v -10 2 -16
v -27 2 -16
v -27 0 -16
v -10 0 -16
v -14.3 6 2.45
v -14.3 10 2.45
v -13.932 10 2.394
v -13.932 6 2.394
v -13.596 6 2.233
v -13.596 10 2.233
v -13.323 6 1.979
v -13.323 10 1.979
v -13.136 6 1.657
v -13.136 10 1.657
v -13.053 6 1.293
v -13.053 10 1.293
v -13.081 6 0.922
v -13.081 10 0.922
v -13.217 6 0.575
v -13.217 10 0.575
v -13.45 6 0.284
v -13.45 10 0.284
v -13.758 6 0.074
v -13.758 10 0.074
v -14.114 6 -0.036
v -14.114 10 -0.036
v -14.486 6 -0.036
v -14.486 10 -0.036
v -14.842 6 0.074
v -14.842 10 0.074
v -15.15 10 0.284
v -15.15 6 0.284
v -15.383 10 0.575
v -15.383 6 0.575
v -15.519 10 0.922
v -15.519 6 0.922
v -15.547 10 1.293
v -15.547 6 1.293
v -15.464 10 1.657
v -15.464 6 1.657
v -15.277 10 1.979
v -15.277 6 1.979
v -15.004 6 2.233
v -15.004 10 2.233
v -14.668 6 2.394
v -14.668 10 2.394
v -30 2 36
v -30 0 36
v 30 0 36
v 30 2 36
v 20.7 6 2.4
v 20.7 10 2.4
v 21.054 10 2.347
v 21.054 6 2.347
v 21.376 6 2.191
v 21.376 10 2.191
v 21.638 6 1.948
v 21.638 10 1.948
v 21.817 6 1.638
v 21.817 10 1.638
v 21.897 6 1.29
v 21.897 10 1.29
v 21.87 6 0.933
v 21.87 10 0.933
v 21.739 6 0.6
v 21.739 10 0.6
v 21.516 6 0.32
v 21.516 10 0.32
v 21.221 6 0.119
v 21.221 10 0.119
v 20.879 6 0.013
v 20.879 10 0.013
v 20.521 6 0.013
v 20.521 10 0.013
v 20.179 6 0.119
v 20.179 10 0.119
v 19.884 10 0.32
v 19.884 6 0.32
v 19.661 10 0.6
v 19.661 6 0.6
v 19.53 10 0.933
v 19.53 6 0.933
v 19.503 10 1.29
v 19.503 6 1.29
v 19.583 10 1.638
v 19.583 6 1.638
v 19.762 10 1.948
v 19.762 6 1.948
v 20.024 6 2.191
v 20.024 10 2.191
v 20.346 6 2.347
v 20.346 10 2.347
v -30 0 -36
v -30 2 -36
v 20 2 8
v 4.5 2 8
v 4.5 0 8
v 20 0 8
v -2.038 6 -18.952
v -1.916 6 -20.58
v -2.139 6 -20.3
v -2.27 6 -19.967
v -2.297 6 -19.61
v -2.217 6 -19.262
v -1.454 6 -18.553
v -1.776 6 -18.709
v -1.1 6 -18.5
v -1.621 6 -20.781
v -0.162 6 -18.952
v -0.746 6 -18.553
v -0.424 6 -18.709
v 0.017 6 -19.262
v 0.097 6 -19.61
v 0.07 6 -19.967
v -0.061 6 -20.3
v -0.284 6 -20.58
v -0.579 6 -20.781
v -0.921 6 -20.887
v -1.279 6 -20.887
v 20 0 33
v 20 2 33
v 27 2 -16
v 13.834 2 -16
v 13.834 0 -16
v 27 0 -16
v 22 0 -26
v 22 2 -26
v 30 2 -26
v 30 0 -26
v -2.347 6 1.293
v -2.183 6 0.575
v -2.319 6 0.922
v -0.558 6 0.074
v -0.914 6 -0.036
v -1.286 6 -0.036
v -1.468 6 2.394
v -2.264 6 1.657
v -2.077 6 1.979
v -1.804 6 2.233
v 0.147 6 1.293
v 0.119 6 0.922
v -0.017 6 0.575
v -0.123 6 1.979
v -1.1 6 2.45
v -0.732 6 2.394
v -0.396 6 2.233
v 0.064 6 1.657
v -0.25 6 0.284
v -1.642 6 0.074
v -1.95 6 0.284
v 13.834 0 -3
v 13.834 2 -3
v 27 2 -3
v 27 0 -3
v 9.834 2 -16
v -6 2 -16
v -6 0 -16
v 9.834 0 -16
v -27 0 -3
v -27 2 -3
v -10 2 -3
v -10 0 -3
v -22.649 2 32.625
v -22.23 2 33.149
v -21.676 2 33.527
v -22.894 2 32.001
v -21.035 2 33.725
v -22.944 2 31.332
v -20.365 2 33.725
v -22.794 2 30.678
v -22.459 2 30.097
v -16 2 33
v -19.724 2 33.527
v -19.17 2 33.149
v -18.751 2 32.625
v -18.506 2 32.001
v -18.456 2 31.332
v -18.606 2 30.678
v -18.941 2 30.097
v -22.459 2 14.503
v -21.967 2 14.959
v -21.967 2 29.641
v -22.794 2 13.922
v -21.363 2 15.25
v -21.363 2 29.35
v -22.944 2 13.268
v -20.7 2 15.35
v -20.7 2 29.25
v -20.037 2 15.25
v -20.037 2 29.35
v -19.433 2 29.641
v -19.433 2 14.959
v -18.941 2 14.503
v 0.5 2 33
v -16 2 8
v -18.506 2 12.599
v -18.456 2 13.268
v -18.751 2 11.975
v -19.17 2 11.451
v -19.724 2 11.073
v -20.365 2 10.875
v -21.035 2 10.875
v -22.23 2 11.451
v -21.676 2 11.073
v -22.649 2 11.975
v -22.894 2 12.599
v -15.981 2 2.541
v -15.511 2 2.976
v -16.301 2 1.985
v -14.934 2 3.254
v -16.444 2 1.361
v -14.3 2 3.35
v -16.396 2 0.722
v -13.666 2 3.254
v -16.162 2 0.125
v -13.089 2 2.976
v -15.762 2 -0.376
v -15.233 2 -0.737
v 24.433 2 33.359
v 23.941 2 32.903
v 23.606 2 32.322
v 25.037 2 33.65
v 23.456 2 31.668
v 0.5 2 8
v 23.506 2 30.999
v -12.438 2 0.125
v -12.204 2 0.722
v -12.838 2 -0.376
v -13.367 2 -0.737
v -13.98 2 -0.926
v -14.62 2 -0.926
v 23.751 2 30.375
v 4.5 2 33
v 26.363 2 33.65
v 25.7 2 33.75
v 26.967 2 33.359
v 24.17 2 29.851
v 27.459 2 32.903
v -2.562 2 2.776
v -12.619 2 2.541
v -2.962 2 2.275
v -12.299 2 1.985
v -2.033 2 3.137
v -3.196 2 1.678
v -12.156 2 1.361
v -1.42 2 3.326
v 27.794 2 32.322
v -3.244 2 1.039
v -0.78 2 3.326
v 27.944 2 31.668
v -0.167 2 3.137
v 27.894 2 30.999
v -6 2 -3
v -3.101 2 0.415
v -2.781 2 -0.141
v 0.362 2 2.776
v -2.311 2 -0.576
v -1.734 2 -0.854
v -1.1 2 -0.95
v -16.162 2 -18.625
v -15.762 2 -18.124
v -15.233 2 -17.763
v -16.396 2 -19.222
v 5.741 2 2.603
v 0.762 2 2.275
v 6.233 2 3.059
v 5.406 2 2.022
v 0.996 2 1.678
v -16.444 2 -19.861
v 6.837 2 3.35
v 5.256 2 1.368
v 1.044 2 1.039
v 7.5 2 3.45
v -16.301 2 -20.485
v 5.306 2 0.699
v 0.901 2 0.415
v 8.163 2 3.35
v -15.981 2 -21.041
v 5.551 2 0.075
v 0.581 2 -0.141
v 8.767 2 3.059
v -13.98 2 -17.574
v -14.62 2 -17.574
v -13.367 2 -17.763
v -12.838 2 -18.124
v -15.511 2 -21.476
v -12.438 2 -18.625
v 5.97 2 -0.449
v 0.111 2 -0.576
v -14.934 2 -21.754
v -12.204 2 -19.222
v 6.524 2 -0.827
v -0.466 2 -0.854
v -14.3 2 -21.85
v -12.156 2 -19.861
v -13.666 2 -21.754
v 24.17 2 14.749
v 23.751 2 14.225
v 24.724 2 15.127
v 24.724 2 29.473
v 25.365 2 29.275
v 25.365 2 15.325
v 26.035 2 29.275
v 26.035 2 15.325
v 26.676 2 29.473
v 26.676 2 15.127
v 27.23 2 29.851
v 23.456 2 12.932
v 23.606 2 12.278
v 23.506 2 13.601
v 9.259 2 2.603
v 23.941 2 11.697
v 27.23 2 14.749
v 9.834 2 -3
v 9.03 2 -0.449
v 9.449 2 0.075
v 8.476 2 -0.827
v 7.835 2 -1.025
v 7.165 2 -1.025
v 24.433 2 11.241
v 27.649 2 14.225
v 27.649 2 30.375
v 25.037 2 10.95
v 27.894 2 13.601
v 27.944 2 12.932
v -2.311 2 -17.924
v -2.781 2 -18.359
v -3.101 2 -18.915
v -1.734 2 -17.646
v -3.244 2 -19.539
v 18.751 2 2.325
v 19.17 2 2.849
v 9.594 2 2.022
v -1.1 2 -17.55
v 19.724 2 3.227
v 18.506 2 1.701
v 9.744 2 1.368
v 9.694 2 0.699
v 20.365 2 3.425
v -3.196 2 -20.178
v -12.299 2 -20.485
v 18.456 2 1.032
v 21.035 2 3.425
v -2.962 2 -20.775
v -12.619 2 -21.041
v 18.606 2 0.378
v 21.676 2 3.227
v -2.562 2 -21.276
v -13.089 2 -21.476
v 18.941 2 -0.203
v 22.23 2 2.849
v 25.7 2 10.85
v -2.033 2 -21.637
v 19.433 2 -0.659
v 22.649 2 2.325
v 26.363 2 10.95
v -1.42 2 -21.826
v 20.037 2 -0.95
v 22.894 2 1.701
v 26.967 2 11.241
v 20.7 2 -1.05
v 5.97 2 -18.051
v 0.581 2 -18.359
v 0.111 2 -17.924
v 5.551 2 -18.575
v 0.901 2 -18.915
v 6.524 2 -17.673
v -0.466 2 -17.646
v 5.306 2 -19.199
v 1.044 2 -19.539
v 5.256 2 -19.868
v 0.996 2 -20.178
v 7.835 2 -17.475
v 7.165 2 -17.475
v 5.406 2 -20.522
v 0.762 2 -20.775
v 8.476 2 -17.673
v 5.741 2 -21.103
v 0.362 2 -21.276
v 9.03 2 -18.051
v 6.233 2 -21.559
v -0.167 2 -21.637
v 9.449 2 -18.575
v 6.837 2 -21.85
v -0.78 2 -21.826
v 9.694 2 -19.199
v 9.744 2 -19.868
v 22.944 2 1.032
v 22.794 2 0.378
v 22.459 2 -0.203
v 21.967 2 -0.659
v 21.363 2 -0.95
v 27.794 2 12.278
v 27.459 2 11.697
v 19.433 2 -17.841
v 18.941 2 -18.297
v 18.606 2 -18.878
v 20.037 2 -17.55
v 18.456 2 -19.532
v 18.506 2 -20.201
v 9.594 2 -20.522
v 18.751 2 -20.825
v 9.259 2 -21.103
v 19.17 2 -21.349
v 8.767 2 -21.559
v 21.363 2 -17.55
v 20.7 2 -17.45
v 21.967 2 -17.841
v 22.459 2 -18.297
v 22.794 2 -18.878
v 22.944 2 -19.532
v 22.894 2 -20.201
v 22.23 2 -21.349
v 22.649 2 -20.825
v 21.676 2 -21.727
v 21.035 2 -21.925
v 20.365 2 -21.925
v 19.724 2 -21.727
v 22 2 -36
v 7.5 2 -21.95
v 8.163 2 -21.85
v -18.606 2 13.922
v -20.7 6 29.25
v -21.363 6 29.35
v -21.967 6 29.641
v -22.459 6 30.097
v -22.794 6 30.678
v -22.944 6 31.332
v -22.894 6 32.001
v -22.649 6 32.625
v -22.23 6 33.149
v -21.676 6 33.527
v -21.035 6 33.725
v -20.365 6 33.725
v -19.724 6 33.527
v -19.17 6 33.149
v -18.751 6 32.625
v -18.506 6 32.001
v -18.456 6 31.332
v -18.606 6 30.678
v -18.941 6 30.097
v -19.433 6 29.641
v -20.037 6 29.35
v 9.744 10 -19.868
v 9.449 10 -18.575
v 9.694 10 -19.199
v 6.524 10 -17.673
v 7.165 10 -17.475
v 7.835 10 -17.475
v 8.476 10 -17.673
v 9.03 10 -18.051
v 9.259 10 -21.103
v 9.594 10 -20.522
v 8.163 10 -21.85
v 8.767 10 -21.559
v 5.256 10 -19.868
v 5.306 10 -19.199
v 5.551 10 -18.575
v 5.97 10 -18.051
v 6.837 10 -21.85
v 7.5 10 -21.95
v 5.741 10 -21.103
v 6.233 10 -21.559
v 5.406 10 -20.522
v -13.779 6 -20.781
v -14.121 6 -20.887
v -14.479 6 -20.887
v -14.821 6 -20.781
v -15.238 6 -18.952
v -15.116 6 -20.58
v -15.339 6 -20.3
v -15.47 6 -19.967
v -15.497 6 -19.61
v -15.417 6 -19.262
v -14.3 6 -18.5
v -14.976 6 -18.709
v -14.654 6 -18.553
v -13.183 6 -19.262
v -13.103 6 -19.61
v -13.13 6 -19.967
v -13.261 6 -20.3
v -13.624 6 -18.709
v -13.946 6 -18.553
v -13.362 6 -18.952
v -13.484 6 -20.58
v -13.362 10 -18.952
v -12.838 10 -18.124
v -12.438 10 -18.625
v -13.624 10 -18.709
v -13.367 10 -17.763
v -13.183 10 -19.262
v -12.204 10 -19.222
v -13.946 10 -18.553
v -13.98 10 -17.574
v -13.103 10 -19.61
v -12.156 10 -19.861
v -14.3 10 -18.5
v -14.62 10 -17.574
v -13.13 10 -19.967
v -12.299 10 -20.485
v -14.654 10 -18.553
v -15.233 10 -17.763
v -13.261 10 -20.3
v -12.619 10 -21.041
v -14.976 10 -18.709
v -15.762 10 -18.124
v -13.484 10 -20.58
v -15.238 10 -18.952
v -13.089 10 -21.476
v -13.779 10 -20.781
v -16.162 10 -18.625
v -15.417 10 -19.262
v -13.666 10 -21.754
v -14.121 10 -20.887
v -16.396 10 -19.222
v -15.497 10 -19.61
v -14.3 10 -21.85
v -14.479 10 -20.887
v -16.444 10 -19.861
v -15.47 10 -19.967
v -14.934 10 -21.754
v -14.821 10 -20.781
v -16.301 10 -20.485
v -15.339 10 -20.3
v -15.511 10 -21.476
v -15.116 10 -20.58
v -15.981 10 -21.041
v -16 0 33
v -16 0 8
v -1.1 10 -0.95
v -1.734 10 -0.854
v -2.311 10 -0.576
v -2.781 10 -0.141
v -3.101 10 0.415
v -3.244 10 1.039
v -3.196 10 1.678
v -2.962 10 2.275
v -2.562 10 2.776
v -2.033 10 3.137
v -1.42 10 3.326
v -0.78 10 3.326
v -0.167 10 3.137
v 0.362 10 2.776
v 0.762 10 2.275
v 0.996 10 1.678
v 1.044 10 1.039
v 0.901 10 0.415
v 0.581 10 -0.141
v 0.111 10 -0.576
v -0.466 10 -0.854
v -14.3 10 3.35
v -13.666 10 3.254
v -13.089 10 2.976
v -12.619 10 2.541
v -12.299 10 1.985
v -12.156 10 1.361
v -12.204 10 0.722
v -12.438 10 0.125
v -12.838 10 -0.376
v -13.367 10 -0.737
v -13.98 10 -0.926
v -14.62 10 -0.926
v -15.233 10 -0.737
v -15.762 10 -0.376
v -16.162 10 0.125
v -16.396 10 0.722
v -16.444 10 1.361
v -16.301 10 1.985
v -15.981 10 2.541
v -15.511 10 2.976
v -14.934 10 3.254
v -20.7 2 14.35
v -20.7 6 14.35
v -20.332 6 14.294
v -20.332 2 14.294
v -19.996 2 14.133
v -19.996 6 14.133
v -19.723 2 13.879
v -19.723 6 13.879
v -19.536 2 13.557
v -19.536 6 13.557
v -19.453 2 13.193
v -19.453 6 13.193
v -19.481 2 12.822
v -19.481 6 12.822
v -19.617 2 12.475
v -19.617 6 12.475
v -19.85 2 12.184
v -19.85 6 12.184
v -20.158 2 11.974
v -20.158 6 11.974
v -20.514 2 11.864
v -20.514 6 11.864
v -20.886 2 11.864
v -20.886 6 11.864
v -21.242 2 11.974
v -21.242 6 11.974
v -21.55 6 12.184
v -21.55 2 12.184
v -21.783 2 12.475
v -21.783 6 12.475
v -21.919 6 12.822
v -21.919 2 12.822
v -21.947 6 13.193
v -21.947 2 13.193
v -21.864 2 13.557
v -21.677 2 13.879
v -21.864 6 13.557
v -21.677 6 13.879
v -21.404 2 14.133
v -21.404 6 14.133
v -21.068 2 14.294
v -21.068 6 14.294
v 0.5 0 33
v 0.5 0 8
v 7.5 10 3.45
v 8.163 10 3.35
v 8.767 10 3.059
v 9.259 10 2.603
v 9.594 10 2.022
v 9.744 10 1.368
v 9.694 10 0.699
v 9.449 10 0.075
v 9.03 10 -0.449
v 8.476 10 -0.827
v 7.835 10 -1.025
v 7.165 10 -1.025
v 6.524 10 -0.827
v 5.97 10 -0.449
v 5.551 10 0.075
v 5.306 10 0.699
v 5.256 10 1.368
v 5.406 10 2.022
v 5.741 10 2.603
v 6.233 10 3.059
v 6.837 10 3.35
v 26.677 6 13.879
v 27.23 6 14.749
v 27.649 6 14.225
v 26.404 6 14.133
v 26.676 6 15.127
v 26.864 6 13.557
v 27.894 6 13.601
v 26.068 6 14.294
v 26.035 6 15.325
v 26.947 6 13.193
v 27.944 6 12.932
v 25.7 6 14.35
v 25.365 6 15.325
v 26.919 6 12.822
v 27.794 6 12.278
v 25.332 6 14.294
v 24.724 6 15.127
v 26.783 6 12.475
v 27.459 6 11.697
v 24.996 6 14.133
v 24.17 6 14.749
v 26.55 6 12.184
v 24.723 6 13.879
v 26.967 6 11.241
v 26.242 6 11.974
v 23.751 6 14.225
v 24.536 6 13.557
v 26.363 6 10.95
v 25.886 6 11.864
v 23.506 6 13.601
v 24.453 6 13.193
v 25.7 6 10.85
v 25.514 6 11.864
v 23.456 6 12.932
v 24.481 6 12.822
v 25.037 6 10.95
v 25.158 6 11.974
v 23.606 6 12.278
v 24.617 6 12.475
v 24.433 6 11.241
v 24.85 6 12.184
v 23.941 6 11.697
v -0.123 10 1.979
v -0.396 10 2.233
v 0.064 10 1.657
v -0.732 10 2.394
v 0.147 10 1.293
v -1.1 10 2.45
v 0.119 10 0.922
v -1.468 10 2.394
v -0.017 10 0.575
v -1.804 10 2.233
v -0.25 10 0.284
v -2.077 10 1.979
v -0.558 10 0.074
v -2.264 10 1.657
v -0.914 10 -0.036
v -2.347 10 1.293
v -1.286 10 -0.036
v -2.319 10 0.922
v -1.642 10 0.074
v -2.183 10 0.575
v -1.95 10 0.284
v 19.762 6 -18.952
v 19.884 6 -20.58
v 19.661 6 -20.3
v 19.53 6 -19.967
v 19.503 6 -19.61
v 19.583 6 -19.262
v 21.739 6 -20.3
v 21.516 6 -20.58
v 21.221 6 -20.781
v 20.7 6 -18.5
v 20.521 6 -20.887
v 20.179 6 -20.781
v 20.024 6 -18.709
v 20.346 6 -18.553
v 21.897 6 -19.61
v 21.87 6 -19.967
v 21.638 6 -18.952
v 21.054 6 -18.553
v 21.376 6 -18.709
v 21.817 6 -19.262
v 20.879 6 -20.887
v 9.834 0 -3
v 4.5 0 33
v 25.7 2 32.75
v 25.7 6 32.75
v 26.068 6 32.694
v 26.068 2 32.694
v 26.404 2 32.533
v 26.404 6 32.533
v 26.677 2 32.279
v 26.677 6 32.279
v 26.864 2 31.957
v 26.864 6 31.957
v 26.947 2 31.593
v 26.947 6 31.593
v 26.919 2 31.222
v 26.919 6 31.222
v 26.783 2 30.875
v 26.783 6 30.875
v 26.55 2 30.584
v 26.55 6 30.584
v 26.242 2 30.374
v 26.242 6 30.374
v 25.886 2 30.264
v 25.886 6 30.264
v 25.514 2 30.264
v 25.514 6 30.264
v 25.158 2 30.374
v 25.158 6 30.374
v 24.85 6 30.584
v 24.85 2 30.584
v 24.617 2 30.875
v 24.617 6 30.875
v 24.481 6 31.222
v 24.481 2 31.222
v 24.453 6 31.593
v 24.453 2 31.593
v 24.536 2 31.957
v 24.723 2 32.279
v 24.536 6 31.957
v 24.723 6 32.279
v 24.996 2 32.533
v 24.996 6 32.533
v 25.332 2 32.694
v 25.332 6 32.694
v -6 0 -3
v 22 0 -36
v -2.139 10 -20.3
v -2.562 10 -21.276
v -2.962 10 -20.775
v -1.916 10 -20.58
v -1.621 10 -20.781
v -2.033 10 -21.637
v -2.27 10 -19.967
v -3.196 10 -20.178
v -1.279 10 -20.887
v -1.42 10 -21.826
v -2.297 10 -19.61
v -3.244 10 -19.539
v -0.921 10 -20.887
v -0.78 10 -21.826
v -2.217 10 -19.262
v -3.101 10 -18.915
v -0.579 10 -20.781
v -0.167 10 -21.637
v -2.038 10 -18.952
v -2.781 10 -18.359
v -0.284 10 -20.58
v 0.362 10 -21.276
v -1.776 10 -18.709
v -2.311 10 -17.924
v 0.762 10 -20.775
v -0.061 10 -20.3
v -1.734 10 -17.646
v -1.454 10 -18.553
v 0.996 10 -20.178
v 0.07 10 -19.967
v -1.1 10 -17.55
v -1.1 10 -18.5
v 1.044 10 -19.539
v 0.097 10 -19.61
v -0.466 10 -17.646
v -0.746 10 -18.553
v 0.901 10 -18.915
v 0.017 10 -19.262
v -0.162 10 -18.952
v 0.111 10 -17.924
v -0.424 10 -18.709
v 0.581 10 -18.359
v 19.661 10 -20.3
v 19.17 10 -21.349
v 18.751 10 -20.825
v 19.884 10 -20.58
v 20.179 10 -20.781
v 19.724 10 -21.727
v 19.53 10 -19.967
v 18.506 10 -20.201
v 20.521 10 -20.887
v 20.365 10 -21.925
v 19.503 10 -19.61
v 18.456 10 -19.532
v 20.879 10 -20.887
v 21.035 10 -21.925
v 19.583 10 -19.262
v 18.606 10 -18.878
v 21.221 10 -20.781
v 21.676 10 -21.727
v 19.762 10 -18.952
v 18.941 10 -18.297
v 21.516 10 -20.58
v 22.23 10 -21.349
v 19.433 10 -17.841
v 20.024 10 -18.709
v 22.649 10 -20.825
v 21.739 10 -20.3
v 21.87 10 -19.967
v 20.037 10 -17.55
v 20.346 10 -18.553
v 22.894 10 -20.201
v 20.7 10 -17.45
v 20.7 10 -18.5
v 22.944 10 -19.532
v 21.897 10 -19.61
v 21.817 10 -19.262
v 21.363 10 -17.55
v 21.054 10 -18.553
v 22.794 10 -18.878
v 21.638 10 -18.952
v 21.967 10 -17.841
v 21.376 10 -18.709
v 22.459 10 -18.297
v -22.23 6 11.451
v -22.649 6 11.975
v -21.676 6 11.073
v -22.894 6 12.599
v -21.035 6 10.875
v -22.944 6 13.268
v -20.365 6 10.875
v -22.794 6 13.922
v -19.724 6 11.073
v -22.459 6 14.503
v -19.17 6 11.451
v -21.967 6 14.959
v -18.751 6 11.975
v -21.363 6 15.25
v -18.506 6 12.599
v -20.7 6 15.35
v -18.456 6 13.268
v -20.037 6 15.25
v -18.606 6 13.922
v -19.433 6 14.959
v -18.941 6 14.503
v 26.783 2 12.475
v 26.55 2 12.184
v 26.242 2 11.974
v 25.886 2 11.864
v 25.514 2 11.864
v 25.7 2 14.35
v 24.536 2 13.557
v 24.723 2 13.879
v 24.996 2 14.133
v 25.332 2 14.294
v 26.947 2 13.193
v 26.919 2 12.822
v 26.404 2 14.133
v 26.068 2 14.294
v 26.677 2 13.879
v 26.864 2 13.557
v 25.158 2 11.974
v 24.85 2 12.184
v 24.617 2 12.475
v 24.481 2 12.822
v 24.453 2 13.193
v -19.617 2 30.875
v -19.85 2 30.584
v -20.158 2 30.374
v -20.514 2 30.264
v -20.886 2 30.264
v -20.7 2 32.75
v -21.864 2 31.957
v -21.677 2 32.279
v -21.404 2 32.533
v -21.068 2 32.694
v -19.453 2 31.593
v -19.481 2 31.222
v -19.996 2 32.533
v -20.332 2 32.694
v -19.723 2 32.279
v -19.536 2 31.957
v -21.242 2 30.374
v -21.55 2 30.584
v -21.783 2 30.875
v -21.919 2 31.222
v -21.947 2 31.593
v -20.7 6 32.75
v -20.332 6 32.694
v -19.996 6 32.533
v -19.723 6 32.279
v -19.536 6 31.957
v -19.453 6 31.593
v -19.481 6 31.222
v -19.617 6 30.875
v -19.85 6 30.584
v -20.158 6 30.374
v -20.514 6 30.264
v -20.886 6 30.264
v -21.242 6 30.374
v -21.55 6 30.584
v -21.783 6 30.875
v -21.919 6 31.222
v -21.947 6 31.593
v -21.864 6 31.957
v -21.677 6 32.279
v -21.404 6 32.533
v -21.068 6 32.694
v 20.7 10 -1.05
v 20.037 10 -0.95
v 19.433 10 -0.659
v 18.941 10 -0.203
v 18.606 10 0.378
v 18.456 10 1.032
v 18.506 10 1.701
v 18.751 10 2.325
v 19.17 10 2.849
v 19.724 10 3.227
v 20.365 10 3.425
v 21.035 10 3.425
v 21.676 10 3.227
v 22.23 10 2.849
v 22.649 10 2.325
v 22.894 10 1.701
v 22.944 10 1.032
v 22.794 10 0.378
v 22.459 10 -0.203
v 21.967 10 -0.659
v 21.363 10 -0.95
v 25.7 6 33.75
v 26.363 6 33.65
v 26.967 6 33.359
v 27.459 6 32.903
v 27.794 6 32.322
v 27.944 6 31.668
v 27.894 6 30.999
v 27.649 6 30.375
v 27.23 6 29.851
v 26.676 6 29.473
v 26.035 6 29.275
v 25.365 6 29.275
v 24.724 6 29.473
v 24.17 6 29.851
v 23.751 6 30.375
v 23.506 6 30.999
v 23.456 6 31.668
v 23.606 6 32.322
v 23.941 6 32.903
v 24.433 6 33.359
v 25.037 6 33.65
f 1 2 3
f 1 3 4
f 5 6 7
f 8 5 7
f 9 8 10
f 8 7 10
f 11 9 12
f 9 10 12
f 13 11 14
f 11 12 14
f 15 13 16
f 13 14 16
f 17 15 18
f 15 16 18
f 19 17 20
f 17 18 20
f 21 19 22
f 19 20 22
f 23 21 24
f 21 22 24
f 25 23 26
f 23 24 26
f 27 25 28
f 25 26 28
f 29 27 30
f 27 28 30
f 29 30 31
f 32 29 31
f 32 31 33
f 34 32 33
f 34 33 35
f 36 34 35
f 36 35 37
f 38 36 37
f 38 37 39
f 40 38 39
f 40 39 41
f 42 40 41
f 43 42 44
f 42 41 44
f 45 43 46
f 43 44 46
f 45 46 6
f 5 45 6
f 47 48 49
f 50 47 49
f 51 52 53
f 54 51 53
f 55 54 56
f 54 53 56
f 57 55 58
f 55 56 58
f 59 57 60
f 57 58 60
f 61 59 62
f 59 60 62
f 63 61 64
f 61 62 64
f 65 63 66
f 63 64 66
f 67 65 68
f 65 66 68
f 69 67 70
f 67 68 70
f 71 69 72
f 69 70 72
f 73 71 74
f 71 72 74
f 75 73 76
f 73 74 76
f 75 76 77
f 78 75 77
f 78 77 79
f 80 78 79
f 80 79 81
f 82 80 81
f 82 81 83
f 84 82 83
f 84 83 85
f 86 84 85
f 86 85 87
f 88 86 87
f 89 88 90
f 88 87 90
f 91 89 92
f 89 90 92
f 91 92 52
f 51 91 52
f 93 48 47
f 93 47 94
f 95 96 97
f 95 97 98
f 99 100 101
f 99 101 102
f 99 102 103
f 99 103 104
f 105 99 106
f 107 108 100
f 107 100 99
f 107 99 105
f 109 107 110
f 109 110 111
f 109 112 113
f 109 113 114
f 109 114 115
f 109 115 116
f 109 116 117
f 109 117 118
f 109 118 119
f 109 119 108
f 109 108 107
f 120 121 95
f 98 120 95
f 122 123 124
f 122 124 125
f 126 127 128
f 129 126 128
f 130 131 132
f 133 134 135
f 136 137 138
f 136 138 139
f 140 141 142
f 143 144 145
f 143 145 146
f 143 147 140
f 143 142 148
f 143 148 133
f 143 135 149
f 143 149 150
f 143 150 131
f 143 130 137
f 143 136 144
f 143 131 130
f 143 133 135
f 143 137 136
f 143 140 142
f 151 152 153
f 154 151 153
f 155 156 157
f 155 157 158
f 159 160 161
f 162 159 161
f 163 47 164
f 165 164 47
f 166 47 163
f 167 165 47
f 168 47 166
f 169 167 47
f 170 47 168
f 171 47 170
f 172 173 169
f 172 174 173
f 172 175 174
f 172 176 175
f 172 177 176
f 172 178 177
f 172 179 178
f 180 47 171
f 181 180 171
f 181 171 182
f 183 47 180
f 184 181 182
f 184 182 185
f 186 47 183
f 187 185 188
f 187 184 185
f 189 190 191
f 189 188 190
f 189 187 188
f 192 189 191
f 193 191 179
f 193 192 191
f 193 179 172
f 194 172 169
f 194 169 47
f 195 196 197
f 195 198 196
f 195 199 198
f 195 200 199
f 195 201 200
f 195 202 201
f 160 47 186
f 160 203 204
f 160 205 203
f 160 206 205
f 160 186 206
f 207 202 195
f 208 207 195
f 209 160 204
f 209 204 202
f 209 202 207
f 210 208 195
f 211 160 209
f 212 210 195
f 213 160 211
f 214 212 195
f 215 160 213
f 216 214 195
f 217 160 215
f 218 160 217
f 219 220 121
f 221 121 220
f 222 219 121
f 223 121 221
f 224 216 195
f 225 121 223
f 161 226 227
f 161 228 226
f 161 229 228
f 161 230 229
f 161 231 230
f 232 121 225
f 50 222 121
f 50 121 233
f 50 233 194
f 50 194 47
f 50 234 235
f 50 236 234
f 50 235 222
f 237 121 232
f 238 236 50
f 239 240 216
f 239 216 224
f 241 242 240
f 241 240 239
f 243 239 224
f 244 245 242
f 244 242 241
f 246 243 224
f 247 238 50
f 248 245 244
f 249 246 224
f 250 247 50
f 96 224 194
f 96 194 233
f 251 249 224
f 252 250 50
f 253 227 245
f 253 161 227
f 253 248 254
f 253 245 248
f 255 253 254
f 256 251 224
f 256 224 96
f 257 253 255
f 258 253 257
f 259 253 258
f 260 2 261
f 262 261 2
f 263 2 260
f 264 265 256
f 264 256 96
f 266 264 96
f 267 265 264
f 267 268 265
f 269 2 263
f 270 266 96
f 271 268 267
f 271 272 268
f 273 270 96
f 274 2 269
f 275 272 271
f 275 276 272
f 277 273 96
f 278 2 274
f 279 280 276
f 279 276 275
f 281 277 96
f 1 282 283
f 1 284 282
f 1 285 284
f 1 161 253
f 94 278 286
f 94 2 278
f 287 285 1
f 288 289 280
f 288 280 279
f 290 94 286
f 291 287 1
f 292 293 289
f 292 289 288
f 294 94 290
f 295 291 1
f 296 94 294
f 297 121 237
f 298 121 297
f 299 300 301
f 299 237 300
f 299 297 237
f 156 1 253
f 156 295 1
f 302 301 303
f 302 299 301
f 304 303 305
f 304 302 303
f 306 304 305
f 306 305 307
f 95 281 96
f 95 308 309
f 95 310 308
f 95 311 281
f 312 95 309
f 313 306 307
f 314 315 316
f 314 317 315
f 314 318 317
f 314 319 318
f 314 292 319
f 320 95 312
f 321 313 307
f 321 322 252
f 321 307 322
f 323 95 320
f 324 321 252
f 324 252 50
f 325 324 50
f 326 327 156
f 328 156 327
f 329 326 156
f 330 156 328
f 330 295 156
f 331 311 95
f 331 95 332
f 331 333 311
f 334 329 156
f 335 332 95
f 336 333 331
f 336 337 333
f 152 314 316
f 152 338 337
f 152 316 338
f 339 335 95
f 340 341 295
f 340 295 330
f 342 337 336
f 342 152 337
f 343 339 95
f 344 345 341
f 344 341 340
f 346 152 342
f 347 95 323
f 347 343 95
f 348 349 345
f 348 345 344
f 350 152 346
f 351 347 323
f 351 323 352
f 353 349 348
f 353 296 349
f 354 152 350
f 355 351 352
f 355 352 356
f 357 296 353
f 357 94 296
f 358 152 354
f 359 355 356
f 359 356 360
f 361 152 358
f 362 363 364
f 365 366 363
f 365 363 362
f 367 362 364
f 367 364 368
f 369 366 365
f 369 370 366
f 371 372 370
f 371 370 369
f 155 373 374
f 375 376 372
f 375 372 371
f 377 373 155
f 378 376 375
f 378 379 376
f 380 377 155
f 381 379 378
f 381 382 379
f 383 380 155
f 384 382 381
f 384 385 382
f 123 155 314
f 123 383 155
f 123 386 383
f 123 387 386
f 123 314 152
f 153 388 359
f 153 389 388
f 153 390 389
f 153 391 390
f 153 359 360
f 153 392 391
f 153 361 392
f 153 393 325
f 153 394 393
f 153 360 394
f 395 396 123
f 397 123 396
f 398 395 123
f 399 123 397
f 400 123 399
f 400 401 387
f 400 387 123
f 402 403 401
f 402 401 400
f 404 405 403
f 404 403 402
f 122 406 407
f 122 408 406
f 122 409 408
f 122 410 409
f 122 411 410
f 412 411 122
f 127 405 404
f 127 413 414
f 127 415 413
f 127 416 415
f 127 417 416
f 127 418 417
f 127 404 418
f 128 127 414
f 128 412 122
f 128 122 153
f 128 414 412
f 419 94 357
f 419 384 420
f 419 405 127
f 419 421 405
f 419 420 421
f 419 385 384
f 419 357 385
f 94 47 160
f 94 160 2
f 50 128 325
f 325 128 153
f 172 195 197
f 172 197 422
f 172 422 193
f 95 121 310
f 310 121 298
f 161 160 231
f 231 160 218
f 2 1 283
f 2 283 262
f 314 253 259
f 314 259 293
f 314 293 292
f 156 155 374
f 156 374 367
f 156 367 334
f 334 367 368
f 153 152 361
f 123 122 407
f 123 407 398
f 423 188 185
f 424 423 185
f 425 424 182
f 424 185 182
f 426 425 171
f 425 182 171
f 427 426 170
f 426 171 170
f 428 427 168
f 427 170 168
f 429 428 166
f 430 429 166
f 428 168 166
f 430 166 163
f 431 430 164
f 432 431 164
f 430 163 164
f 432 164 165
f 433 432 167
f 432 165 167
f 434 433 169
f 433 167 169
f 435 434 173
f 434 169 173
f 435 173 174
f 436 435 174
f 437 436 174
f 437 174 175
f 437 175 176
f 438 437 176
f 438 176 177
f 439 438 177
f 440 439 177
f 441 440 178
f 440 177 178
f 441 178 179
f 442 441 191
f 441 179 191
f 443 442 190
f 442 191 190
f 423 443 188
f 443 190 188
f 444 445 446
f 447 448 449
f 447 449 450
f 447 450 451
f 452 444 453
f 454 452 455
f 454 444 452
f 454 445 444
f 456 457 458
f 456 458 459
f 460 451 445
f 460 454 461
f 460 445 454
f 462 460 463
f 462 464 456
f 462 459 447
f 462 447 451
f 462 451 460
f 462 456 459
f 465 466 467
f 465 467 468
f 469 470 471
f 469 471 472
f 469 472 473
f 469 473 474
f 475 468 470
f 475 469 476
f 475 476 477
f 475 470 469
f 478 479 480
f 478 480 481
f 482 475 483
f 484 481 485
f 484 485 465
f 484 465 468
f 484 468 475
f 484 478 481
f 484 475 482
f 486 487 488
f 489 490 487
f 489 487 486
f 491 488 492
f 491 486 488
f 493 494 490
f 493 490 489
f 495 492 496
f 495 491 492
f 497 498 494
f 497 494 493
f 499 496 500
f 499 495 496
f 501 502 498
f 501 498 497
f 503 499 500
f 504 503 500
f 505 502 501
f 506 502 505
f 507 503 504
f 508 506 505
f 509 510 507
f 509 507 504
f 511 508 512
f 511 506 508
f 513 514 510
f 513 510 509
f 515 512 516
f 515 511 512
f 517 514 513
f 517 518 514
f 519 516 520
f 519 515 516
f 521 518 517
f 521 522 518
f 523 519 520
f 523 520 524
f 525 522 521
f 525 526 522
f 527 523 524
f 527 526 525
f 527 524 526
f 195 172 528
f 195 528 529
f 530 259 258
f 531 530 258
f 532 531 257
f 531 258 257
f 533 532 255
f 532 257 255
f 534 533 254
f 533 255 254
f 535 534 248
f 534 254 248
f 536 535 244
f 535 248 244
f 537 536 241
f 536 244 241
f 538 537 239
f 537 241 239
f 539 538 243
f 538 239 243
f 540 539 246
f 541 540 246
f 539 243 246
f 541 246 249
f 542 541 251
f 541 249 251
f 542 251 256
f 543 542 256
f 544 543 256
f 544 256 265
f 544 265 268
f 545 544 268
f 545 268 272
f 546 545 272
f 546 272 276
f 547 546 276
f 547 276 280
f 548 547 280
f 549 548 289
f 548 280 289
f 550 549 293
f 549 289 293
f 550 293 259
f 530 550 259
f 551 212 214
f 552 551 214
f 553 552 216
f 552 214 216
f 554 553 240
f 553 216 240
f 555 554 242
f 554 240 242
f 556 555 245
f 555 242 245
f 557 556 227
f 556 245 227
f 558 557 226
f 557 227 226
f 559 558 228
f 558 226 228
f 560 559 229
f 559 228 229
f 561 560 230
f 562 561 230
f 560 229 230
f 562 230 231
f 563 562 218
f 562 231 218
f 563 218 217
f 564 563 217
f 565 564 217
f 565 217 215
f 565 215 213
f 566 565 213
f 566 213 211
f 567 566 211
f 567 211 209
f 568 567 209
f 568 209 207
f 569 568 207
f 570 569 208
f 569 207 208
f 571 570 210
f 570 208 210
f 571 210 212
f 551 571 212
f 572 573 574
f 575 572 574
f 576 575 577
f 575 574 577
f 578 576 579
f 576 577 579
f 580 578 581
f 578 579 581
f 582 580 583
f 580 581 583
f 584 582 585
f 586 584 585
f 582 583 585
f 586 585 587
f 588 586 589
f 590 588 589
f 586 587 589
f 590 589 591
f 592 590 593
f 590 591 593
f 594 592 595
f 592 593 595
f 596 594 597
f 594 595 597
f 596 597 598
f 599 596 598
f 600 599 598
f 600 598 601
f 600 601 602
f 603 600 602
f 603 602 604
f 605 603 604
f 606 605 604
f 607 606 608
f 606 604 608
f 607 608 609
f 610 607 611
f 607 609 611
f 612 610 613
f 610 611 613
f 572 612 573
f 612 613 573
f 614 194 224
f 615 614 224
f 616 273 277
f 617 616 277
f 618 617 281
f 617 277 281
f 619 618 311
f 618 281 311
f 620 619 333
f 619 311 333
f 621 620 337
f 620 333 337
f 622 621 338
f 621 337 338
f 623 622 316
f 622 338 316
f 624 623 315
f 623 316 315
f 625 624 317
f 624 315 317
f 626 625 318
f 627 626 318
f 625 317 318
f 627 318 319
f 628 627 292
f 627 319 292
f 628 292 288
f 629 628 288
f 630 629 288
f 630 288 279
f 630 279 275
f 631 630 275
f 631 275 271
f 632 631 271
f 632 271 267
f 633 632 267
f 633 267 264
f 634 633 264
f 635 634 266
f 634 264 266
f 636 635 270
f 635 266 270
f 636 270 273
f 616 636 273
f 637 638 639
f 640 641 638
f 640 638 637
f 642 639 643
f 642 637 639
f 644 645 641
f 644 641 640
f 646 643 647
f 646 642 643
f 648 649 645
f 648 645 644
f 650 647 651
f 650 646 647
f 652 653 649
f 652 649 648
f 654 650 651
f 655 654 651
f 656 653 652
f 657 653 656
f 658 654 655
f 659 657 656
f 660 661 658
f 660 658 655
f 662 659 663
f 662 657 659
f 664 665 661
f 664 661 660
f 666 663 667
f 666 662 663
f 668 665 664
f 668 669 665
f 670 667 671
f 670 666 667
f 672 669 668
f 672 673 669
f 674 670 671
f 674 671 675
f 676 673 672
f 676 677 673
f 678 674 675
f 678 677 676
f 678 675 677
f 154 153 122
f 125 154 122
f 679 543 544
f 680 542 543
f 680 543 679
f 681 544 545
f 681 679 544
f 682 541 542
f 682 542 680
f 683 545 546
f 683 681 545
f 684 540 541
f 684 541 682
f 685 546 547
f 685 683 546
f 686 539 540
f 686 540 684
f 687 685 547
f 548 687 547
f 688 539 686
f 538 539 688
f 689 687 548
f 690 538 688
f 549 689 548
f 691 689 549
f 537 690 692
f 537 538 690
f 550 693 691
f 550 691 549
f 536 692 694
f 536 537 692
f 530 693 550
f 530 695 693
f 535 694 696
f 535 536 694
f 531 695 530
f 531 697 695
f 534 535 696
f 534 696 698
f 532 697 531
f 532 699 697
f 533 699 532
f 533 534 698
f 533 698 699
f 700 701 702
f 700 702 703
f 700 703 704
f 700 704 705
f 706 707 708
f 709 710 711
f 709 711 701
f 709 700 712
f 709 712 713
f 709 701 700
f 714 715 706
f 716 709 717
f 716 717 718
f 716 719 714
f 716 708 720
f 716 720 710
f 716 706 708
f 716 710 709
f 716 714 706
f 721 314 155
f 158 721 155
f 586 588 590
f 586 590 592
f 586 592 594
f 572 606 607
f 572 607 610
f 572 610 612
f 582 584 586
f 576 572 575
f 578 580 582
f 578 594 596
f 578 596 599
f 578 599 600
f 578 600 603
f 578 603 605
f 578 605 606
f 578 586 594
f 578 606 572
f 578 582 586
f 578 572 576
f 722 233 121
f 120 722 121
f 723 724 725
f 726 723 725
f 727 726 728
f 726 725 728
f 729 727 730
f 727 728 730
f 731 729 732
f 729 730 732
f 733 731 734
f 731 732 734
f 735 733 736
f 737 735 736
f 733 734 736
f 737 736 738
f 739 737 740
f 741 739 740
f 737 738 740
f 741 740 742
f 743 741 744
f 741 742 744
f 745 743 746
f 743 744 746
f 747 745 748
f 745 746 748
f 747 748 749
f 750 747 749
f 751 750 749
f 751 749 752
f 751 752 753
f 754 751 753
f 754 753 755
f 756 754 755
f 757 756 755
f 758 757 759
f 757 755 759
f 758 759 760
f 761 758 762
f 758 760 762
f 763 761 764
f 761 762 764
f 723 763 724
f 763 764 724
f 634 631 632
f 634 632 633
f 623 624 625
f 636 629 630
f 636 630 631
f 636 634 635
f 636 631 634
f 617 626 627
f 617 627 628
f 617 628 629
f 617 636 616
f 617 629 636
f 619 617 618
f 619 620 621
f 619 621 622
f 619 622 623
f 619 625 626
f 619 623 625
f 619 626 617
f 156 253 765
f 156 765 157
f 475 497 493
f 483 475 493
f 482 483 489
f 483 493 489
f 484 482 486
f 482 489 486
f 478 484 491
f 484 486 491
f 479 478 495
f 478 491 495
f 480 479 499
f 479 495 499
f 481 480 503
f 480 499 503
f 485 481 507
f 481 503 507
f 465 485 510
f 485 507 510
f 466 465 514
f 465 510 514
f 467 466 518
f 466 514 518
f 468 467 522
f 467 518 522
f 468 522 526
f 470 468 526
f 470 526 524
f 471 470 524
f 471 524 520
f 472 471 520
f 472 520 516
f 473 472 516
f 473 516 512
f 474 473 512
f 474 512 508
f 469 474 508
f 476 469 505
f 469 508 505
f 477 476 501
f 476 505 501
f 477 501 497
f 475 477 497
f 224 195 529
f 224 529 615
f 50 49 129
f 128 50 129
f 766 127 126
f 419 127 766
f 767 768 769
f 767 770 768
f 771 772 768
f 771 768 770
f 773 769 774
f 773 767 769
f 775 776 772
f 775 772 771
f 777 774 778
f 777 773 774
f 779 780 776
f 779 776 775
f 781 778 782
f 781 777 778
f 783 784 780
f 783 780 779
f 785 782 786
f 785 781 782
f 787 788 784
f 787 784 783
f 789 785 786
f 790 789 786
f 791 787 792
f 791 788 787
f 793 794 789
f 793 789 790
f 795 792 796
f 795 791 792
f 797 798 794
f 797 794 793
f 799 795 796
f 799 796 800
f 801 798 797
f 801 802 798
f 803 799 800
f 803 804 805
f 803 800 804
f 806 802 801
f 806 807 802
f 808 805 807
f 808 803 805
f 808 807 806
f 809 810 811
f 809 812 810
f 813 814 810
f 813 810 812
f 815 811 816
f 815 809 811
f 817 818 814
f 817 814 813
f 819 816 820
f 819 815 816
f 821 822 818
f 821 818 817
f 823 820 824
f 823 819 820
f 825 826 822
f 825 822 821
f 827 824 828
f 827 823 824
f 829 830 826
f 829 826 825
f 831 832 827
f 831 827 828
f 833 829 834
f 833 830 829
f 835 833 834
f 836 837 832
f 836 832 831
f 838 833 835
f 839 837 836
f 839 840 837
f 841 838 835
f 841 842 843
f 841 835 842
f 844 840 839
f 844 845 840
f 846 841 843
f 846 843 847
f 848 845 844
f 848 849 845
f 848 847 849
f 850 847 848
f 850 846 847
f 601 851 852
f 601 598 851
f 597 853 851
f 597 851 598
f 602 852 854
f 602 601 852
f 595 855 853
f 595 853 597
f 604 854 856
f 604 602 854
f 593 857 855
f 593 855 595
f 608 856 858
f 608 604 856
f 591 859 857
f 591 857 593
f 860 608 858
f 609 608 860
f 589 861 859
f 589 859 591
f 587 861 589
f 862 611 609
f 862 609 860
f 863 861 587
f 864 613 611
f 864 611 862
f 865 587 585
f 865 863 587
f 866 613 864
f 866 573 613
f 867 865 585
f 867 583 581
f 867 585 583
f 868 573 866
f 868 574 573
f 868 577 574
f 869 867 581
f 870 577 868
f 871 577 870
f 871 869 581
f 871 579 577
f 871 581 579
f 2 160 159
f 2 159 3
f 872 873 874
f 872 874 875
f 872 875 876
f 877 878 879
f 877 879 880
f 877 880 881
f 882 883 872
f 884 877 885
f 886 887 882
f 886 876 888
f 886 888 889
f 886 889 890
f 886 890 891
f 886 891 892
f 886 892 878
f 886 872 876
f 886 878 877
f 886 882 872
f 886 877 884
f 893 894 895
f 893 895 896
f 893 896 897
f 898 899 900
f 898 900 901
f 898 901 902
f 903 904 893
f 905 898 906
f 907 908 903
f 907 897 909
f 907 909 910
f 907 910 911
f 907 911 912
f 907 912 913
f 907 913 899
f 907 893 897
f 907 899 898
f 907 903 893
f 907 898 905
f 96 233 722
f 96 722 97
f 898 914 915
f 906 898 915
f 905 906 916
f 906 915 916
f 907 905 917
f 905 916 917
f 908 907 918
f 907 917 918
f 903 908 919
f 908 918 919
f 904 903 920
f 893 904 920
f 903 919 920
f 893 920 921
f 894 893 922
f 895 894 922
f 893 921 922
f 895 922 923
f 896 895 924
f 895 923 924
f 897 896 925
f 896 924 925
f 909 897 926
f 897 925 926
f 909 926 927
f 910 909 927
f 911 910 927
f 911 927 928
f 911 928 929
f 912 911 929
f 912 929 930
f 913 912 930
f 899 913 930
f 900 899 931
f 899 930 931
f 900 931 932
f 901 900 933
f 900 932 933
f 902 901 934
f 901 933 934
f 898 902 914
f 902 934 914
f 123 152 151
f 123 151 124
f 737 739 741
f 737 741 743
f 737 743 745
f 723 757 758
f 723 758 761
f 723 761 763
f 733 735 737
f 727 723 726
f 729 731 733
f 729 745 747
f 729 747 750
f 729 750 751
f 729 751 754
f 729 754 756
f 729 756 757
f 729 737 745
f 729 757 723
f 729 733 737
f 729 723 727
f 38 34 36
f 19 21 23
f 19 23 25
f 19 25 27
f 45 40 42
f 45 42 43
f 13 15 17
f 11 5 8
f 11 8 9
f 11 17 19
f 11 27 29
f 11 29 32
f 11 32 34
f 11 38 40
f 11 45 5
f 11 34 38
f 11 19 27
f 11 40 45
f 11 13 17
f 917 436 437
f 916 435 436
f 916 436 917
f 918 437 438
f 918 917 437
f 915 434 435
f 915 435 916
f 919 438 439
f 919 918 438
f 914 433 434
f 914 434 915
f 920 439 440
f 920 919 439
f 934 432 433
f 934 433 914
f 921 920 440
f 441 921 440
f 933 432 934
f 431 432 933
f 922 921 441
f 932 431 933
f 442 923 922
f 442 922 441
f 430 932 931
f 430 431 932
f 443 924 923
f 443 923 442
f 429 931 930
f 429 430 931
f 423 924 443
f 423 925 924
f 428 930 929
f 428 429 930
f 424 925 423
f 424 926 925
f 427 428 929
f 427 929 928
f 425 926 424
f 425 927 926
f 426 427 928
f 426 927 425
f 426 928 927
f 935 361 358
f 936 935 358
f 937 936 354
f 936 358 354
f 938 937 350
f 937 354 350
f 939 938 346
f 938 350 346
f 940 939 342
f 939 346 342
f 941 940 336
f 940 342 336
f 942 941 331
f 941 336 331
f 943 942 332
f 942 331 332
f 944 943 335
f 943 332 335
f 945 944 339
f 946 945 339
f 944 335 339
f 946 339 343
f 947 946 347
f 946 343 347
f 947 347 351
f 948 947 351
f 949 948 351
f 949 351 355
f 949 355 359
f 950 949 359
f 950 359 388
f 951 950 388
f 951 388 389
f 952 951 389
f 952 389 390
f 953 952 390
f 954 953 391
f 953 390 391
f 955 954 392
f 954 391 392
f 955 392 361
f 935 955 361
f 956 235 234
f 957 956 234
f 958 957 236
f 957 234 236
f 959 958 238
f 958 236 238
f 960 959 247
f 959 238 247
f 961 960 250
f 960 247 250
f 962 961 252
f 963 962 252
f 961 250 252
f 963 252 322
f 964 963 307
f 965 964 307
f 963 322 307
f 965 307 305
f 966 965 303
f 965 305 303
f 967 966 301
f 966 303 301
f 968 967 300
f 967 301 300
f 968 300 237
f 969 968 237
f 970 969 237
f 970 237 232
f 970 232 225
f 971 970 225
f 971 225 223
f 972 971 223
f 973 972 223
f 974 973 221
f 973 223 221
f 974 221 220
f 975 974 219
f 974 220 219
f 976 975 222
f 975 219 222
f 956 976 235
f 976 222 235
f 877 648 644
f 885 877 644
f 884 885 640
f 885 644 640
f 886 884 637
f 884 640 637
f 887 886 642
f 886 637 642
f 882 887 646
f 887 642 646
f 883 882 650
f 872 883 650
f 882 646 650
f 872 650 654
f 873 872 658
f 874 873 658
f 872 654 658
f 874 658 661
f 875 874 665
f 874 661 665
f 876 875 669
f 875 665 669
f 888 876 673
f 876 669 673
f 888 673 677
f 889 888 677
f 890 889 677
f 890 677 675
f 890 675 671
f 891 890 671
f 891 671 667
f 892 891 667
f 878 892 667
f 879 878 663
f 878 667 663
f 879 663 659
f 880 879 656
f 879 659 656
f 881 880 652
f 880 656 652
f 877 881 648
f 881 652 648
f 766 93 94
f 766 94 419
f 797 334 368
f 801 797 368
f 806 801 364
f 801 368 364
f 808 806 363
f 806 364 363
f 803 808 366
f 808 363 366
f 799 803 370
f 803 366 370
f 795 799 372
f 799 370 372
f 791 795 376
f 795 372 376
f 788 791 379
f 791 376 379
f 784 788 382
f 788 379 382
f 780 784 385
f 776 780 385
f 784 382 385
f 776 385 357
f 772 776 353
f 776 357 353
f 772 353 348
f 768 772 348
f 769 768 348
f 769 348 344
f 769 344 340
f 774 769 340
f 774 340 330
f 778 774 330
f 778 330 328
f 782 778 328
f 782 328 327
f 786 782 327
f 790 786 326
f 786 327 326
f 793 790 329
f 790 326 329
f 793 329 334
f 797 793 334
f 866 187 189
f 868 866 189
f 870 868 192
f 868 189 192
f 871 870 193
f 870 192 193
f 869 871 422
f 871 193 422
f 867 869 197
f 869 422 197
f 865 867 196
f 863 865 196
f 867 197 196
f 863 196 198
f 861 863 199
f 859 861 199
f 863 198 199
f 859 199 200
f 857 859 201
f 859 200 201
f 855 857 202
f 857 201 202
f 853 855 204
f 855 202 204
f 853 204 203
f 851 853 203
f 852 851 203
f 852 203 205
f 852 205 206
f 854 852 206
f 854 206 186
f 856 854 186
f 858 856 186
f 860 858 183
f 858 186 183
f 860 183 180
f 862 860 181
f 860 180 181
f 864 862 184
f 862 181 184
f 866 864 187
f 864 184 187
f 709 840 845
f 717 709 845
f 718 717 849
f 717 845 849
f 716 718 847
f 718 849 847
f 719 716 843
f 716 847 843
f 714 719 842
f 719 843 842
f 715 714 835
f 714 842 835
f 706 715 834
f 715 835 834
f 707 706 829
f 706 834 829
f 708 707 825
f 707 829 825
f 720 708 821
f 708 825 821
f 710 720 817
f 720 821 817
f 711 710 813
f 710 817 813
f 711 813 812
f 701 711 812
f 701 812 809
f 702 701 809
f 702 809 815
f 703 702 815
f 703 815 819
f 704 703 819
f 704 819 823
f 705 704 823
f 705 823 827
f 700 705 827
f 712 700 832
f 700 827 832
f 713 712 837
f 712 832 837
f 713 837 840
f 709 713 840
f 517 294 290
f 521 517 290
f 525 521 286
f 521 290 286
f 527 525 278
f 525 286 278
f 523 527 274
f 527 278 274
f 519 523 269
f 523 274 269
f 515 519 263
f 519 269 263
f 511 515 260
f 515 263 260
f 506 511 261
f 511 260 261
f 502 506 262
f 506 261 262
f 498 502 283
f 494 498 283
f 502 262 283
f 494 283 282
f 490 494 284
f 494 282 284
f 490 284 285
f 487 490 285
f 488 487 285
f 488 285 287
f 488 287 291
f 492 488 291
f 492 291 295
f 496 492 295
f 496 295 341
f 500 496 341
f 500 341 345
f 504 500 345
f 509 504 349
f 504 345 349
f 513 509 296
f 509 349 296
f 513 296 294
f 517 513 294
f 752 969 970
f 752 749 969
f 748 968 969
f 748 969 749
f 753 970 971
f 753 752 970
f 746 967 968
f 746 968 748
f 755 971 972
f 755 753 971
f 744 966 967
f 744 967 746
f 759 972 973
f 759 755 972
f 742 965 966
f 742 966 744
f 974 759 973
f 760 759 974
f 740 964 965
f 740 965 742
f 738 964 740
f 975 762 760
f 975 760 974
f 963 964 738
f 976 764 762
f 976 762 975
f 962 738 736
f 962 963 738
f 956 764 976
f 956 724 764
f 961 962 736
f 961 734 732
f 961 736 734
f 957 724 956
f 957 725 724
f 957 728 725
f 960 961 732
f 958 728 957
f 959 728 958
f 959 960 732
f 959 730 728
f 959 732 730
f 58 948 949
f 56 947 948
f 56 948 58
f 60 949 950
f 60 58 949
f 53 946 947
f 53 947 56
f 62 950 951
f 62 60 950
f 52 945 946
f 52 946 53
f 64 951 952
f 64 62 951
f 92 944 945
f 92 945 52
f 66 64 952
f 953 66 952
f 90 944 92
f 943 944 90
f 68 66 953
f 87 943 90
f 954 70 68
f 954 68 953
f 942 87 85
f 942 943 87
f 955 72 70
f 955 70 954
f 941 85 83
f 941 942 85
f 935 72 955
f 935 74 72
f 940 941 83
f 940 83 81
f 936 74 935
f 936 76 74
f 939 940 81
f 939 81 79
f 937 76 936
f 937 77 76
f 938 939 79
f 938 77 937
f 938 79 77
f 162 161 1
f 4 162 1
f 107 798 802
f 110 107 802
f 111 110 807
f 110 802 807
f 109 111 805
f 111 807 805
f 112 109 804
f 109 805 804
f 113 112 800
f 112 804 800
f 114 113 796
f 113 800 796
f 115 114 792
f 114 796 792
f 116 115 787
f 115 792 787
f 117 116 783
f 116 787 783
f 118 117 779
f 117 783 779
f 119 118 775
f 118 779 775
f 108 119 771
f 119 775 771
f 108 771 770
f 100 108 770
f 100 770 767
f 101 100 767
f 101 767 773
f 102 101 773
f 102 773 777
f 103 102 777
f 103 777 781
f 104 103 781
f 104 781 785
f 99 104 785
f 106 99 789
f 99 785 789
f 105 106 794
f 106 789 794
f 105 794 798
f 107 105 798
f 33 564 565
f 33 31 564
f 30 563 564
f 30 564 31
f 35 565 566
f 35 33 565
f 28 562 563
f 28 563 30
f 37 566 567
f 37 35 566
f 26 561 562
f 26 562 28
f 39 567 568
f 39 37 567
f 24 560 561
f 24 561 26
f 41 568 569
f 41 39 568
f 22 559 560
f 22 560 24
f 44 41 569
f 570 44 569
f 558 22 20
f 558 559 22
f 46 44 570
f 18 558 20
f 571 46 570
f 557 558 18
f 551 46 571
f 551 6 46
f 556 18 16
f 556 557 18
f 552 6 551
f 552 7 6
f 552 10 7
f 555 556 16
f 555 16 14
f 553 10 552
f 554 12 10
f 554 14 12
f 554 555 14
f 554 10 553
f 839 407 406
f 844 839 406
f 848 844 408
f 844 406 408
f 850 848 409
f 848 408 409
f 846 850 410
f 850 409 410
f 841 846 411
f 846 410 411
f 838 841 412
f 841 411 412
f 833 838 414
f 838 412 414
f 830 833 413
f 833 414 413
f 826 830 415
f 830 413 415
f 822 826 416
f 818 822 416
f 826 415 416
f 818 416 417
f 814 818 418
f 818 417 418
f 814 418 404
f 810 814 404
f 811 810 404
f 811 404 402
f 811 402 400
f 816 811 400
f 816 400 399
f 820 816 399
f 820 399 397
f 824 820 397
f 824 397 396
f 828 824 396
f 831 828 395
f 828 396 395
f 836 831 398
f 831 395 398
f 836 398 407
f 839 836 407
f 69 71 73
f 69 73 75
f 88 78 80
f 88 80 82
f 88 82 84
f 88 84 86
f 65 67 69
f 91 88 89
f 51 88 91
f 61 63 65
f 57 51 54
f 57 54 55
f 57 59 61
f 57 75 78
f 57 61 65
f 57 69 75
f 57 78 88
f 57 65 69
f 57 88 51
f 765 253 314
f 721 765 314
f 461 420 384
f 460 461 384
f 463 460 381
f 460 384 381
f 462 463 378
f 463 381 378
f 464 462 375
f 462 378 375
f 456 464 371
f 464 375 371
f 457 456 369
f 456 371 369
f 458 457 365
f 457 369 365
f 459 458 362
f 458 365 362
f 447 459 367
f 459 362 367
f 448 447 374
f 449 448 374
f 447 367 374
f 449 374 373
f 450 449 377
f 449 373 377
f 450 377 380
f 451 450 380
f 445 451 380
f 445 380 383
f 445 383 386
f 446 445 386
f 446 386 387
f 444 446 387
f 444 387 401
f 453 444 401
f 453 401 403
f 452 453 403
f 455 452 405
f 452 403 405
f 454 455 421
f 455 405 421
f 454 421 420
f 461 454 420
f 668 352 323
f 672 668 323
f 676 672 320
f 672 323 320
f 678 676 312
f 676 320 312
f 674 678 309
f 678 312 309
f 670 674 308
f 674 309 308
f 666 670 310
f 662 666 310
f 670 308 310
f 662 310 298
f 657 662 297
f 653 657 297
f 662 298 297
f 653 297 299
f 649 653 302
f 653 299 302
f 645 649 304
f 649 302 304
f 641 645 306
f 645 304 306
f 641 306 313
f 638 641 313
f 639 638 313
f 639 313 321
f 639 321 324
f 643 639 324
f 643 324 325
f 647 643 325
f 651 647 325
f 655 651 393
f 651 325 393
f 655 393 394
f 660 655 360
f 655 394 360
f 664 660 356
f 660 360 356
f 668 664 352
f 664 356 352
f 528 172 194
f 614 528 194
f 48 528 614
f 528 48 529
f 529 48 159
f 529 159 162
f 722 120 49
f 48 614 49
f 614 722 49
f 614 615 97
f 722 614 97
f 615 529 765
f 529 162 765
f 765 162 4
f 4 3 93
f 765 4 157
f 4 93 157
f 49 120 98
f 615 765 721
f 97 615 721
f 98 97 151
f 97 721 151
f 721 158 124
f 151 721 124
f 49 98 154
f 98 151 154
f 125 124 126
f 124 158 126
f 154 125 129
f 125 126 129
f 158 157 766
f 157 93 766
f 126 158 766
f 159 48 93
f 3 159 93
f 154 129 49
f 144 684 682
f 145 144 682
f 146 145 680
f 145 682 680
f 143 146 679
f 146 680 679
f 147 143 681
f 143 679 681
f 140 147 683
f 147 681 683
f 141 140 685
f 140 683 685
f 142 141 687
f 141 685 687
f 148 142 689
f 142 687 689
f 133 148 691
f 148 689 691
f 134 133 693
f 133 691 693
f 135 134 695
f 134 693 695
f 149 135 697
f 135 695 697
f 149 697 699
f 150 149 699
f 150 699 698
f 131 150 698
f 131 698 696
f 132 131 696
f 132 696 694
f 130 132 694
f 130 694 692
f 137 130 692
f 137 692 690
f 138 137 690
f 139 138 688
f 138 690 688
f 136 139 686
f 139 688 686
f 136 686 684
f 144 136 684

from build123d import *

# Parameters (mm, degrees)
SKETCH1_W               = 60
SKETCH1_H               = 72
BOTTOM_DEPTH            = 2
SKETCH2_R               = 2.25
PIN_LOCS_DEPTH          = 4
SKETCH5_R               = 1.25
PIN_HOLES_DEPTH         = 4
SKETCH3_R               = 2.25
SKETCH3_R_2             = 2.15
SENSOR_PINS_DEPTH       = 8
SKETCH6_R               = 1.25
SKETCH6_R_2             = 1.2
PIN_HOLES_SENSORS_DEPTH = 4
SKETCH4_W               = 8
SKETCH4_H               = 10
POWER_CABLE_DEPTH       = 2
SKETCH7_W               = 16.5
SKETCH7_H               = 25
SKETCH7_W_2             = 17
SKETCH7_H_2             = 13
SKETCH7_W_3             = 15.833991833
SKETCH7_W_4             = 13.166008167
SKETCH7_W_5             = 15.5
CUT_EXTRUDE1_DEPTH      = 2


with BuildPart() as part:
    # Sketch1 → Bottom (new body)
    with BuildSketch(Plane(origin=(0, 0, 0), x_dir=(1, 0, 0), z_dir=(0, 1, 0))):
        Rectangle(SKETCH1_W, SKETCH1_H)
    extrude(amount=BOTTOM_DEPTH)

    # Sketch2 → Pin Locs (add)
    with BuildSketch(Plane(origin=(0, 2, 0), x_dir=(1, 0, 0), z_dir=(0, 1, 0))):
        with Locations(Location((25.7, -13.1, 0), (0, 0, 90))):
            Circle(SKETCH2_R)
        with Locations(Location((-20.7, -13.1, 0), (0, 0, 270))):
            Circle(SKETCH2_R)
        with Locations(Location((25.7, -31.5, 0), (0, 0, 270))):
            Circle(SKETCH2_R)
        with Locations(Location((-20.7, -31.5, 0), (0, 0, 90))):
            Circle(SKETCH2_R)
    extrude(amount=PIN_LOCS_DEPTH)

    # Sketch5 → Pin Holes (cut)
    with BuildSketch(Plane(origin=(0, 6, 0), x_dir=(1, 0, 0), z_dir=(0, 1, 0))):
        with Locations(Location((-20.7, -31.5, 0), (0, 0, 270))):
            Circle(SKETCH5_R)
        with Locations(Location((-20.7, -13.1, 0), (0, 0, 270))):
            Circle(SKETCH5_R)
        with Locations(Location((25.7, -13.1, 0), (0, 0, 270))):
            Circle(SKETCH5_R)
        with Locations(Location((25.7, -31.5, 0), (0, 0, 270))):
            Circle(SKETCH5_R)
    extrude(amount=-PIN_HOLES_DEPTH, mode=Mode.SUBTRACT)

    # Sketch3 → Sensor Pins (add)
    with BuildSketch(Plane(origin=(0, 2, 0), x_dir=(1, 0, 0), z_dir=(0, 1, 0))):
        with Locations(Location((20.7, 19.7, 0), (0, 0, 270))):
            Circle(SKETCH3_R)
        with Locations(Location((20.7, -1.2, 0), (0, 0, 90))):
            Circle(SKETCH3_R)
        with Locations(Location((7.5, -1.2, 0), (0, 0, 270))):
            Circle(SKETCH3_R)
        with Locations(Location((7.5, 19.7, 0), (0, 0, 90))):
            Circle(SKETCH3_R)
        with Locations(Location((-1.1, 19.7, 0), (0, 0, 270))):
            Circle(SKETCH3_R_2)
        with Locations(Location((-1.1, -1.2, 0), (0, 0, 90))):
            Circle(SKETCH3_R_2)
        with Locations(Location((-14.3, -1.2, 0), (0, 0, 270))):
            Circle(SKETCH3_R_2)
        with Locations(Location((-14.3, 19.7, 0), (0, 0, 90))):
            Circle(SKETCH3_R_2)
    extrude(amount=SENSOR_PINS_DEPTH)

    # Sketch6 → Pin Holes Sensors (cut)
    with BuildSketch(Plane(origin=(0, 10, 0), x_dir=(1, 0, 0), z_dir=(0, 1, 0))):
        with Locations(Location((-14.3, -1.2, 0), (0, 0, 270))):
            Circle(SKETCH6_R)
        with Locations(Location((-1.1, -1.2, 0), (0, 0, 270))):
            Circle(SKETCH6_R)
        with Locations(Location((-1.1, 19.7, 0), (0, 0, 270))):
            Circle(SKETCH6_R_2)
        with Locations(Location((-14.3, 19.7, 0), (0, 0, 270))):
            Circle(SKETCH6_R_2)
        with Locations(Location((20.7, -1.2, 0), (0, 0, 270))):
            Circle(SKETCH6_R_2)
        with Locations(Location((20.7, 19.7, 0), (0, 0, 270))):
            Circle(SKETCH6_R_2)
    extrude(amount=-PIN_HOLES_SENSORS_DEPTH, mode=Mode.SUBTRACT)

    # Sketch4 → Power Cable (cut)
    with BuildSketch(Plane(origin=(0, 2, 0), x_dir=(1, 0, 0), z_dir=(0, 1, 0))):
        with Locations((26, 31)):
            Rectangle(SKETCH4_W, SKETCH4_H)
    extrude(amount=-POWER_CABLE_DEPTH, mode=Mode.SUBTRACT)

    # Sketch7 → Cut-Extrude1 (cut)
    with BuildSketch(Plane(origin=(0, 2, 0), x_dir=(1, 0, 0), z_dir=(0, 1, 0))):
        with Locations((-7.75, -20.5)):
            Rectangle(SKETCH7_W, SKETCH7_H)
        with Locations((-18.5, 9.5)):
            Rectangle(SKETCH7_W_2, SKETCH7_H_2)
        with Locations((1.916995917, 9.5)):
            Rectangle(SKETCH7_W_3, SKETCH7_H_2)
        with Locations((20.416995916, 9.5)):
            Rectangle(SKETCH7_W_4, SKETCH7_H_2)
        with Locations((12.25, -20.5)):
            Rectangle(SKETCH7_W_5, SKETCH7_H)
    extrude(amount=-CUT_EXTRUDE1_DEPTH, mode=Mode.SUBTRACT)


solid = part.part
